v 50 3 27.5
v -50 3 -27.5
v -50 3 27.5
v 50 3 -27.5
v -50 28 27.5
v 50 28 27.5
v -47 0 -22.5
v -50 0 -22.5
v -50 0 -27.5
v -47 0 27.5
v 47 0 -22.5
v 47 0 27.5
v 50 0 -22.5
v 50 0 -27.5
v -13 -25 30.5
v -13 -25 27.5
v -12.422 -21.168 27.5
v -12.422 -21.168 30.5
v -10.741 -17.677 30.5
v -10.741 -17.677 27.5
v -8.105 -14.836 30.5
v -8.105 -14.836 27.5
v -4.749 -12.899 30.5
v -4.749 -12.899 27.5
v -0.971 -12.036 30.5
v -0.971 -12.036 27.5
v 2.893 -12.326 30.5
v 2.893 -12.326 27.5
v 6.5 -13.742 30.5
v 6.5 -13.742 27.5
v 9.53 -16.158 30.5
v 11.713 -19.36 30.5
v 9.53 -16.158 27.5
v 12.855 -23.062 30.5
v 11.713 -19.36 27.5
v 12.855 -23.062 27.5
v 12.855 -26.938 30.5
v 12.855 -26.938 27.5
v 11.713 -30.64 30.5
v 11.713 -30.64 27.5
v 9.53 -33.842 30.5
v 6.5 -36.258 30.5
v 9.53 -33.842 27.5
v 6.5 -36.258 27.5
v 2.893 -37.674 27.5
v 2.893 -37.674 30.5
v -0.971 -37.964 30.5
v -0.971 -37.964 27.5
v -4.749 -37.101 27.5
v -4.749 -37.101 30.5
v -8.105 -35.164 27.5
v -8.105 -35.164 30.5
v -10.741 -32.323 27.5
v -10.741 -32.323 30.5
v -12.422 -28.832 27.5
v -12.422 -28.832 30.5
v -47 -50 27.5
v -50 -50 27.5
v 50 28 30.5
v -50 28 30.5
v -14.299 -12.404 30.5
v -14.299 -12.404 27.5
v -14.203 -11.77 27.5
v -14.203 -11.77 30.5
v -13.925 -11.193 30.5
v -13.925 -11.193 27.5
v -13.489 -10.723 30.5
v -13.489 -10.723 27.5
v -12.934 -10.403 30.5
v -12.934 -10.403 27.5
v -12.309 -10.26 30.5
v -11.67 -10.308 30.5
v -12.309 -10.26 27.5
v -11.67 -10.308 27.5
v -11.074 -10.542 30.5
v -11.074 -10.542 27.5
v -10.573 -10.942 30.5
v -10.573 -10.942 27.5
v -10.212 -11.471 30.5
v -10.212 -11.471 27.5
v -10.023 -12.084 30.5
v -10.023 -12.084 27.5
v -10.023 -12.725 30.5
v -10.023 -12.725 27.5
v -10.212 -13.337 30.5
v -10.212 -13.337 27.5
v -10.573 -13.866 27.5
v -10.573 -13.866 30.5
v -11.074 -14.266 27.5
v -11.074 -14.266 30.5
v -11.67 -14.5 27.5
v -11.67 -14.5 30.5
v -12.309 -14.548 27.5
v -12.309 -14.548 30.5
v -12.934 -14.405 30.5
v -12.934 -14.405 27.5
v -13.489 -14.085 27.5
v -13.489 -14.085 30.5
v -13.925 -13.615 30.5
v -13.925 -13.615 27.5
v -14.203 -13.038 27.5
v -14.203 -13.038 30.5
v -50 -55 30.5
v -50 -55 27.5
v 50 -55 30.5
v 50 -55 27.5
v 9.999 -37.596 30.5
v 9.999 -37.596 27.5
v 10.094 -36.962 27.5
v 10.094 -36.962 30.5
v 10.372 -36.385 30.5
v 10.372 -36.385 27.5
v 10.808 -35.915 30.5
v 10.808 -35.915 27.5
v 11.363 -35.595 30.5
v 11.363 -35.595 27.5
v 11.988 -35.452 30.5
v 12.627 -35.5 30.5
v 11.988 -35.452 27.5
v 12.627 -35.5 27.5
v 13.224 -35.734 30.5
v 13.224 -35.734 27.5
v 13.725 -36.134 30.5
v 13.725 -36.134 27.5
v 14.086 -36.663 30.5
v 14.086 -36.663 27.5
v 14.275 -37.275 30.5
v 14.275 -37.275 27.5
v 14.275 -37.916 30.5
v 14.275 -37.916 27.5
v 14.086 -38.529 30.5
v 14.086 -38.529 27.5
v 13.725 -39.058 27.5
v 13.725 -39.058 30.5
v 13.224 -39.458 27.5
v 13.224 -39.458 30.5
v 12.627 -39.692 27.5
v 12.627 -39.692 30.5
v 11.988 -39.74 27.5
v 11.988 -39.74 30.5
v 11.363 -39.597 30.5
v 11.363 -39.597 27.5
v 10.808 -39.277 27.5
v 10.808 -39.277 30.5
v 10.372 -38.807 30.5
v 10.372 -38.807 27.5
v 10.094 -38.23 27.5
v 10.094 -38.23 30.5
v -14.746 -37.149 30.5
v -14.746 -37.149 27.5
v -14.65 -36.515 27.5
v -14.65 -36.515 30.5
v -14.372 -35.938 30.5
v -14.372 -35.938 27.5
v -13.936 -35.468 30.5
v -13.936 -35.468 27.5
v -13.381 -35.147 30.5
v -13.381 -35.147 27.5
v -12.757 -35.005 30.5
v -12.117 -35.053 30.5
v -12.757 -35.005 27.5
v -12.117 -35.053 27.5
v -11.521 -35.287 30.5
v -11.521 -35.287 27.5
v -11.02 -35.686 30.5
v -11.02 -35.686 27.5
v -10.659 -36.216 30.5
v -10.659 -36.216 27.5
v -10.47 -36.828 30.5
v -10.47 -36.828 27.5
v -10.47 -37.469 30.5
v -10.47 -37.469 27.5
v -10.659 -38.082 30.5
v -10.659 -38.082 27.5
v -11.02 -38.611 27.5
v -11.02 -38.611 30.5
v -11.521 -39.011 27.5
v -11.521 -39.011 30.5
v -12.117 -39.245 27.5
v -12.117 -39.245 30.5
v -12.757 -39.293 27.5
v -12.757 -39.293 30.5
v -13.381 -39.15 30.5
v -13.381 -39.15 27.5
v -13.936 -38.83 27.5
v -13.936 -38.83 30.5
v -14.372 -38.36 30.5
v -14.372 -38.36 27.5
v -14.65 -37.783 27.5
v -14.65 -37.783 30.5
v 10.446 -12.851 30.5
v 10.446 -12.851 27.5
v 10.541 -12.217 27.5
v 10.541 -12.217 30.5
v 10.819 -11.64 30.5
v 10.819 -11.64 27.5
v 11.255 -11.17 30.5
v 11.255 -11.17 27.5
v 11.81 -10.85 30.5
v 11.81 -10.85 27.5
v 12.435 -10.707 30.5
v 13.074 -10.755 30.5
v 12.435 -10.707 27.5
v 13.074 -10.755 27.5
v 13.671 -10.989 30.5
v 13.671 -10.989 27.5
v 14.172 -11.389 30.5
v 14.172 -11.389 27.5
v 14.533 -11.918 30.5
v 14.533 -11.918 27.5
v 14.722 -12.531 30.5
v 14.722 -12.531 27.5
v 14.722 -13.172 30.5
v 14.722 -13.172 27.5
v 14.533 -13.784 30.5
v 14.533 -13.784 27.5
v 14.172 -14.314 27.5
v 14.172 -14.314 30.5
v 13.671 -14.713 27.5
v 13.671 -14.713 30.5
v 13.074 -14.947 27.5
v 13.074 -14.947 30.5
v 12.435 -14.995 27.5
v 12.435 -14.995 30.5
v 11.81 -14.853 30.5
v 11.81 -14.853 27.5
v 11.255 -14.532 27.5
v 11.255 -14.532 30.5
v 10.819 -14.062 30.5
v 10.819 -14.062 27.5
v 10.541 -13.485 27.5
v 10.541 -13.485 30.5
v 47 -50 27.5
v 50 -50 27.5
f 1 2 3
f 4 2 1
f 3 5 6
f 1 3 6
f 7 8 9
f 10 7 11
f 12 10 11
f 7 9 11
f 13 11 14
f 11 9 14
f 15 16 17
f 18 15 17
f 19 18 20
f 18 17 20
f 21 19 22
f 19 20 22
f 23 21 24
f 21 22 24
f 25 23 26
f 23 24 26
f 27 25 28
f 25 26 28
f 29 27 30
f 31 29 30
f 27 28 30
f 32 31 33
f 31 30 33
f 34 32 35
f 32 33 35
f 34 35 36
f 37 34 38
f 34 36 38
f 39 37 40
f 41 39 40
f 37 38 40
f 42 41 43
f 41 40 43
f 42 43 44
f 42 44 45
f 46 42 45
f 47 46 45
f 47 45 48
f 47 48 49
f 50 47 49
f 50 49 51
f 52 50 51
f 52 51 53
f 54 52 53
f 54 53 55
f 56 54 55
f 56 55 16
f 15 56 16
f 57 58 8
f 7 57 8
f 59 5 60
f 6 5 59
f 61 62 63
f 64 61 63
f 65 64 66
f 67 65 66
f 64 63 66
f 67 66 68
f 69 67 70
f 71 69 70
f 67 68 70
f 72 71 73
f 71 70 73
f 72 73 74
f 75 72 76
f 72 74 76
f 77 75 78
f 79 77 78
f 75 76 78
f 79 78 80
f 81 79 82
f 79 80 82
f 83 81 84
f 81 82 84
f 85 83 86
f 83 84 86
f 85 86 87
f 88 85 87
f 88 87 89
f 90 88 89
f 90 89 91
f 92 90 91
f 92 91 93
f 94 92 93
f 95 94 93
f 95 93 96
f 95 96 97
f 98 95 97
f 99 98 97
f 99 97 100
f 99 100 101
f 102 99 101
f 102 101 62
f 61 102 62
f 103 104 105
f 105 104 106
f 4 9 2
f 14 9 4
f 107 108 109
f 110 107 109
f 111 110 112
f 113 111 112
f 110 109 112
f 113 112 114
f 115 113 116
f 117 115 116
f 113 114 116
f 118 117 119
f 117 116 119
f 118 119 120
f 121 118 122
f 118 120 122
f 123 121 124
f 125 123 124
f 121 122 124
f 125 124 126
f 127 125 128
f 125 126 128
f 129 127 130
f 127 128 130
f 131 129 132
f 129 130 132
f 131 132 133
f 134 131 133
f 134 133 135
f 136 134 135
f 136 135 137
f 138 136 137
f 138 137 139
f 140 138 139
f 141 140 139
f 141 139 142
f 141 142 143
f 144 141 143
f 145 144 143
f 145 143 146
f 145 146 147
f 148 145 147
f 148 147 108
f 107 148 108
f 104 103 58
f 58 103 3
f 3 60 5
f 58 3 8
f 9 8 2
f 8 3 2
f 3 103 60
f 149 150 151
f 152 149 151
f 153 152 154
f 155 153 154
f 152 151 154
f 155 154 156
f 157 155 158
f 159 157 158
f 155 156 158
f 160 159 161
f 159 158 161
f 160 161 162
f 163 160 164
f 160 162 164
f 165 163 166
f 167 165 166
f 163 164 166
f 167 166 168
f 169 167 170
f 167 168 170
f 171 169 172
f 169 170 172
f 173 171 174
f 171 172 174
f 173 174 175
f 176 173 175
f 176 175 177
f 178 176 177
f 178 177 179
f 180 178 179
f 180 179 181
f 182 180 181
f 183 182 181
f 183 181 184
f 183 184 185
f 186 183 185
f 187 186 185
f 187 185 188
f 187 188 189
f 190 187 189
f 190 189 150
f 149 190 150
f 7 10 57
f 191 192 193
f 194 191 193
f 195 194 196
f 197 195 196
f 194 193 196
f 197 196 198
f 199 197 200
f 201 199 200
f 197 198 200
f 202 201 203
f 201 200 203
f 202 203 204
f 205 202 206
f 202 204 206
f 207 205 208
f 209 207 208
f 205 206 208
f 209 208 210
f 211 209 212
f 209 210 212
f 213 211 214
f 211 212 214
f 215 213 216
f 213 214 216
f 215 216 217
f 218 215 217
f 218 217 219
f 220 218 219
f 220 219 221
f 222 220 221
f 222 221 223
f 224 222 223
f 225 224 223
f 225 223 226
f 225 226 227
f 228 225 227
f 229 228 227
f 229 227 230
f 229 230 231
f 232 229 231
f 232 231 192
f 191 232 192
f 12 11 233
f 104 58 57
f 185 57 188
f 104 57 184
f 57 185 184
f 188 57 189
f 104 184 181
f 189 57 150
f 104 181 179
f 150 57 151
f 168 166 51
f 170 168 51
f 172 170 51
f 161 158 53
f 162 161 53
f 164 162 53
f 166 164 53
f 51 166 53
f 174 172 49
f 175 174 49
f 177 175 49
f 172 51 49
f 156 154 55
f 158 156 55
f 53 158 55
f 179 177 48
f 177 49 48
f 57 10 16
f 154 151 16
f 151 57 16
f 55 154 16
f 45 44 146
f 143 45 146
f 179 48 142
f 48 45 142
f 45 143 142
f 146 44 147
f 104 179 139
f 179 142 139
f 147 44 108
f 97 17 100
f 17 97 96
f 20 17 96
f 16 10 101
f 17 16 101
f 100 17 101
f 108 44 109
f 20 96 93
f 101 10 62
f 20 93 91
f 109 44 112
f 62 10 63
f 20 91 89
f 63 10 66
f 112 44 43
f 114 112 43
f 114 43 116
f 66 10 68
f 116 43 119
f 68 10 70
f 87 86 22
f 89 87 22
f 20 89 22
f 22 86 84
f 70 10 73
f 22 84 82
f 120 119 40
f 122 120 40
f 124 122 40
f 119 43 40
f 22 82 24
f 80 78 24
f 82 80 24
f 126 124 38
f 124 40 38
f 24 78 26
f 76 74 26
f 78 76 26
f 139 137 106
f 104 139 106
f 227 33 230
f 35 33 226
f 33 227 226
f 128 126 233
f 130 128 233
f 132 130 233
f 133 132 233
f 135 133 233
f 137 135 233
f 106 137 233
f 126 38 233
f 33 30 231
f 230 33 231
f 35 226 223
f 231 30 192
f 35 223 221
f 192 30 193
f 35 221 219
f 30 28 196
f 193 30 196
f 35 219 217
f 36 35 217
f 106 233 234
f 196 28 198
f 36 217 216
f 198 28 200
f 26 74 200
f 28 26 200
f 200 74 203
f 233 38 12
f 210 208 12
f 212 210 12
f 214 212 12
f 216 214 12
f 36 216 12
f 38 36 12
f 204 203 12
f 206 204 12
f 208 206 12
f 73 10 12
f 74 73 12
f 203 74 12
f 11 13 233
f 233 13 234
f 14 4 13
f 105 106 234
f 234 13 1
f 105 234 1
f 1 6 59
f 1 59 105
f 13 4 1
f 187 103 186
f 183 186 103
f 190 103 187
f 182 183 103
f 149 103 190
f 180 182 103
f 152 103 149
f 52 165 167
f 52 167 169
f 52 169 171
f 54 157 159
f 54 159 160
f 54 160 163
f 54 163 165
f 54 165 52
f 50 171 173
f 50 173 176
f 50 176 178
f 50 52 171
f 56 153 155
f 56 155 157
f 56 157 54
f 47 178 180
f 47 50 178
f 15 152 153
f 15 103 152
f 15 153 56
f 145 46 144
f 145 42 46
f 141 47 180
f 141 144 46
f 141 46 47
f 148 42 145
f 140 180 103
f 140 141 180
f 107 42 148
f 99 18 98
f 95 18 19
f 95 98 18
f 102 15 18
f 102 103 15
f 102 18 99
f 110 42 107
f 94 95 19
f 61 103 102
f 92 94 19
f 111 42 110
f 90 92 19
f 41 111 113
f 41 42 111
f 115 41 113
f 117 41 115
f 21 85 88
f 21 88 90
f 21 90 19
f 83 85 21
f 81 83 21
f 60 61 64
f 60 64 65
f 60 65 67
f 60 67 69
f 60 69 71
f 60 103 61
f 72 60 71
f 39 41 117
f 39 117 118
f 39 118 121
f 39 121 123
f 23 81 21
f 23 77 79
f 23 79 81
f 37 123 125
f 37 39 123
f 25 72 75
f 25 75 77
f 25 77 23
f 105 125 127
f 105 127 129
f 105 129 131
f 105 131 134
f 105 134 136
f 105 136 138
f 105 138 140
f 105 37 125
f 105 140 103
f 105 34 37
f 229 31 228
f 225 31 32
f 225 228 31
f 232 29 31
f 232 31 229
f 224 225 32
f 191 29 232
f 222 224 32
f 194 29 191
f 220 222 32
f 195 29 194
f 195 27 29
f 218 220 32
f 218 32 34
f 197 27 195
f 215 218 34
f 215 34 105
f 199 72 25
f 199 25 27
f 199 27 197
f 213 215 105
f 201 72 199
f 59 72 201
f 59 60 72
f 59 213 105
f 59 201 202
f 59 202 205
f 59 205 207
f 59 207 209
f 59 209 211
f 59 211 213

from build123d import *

# Parameters (mm, degrees)
SKETCH1_W           = 100
SKETCH1_H           = 55
BOSS_EXTRUDE1_DEPTH = 3
SKETCH2_W           = 100
SKETCH2_H           = 83
BOSS_EXTRUDE2_DEPTH = 3
BOSS_EXTRUDE3_DEPTH = 3
BOSS_EXTRUDE4_DEPTH = 3
SKETCH5_R           = 13
SKETCH5_R_2         = 2.15
CUT_EXTRUDE1_DEPTH  = 4


with BuildPart() as part:
    # Sketch1 → Boss-Extrude1 (new body)
    with BuildSketch(Plane(origin=(0, 0, 0), x_dir=(1, 0, 0), z_dir=(0, 1, 0))):
        Rectangle(SKETCH1_W, SKETCH1_H)
    extrude(amount=BOSS_EXTRUDE1_DEPTH)

    # Sketch2 → Boss-Extrude2 (add)
    with BuildSketch(Plane.XY.offset(27.5)):
        with Locations((0, -13.5)):
            Rectangle(SKETCH2_W, SKETCH2_H)
    extrude(amount=BOSS_EXTRUDE2_DEPTH)

    # Sketch3 → Boss-Extrude3 (add)
    with BuildSketch(Plane(origin=(50, 0, 0), x_dir=(0, 0, -1), z_dir=(1, 0, 0))):
        Polygon((-27.5, 0), (22.5, 0), (-27.5, -50), align=None)
    extrude(amount=-BOSS_EXTRUDE3_DEPTH)

    # Sketch4 → Boss-Extrude4 (add)
    with BuildSketch(Plane.ZY.offset(50)):
        Polygon((27.5, 0), (27.5, -50), (-22.5, 0), align=None)
    extrude(amount=-BOSS_EXTRUDE4_DEPTH)

    # Sketch5 → Cut-Extrude1 (cut, through all)
    with BuildSketch(Plane(origin=(0, 0, 27.5), x_dir=(-1, 0, 0), z_dir=(0, 0, -1))):
        with Locations((0, -25)):
            Circle(SKETCH5_R)
        with Locations((12.148789351, -12.404091248)):
            Circle(SKETCH5_R_2)
        with Locations((12.595908752, -37.148789351)):
            Circle(SKETCH5_R_2)
        with Locations((-12.148789351, -37.595908752)):
            Circle(SKETCH5_R_2)
        with Locations((-12.595908752, -12.851210649)):
            Circle(SKETCH5_R_2)
    extrude(amount=-CUT_EXTRUDE1_DEPTH, mode=Mode.SUBTRACT)


solid = part.part
